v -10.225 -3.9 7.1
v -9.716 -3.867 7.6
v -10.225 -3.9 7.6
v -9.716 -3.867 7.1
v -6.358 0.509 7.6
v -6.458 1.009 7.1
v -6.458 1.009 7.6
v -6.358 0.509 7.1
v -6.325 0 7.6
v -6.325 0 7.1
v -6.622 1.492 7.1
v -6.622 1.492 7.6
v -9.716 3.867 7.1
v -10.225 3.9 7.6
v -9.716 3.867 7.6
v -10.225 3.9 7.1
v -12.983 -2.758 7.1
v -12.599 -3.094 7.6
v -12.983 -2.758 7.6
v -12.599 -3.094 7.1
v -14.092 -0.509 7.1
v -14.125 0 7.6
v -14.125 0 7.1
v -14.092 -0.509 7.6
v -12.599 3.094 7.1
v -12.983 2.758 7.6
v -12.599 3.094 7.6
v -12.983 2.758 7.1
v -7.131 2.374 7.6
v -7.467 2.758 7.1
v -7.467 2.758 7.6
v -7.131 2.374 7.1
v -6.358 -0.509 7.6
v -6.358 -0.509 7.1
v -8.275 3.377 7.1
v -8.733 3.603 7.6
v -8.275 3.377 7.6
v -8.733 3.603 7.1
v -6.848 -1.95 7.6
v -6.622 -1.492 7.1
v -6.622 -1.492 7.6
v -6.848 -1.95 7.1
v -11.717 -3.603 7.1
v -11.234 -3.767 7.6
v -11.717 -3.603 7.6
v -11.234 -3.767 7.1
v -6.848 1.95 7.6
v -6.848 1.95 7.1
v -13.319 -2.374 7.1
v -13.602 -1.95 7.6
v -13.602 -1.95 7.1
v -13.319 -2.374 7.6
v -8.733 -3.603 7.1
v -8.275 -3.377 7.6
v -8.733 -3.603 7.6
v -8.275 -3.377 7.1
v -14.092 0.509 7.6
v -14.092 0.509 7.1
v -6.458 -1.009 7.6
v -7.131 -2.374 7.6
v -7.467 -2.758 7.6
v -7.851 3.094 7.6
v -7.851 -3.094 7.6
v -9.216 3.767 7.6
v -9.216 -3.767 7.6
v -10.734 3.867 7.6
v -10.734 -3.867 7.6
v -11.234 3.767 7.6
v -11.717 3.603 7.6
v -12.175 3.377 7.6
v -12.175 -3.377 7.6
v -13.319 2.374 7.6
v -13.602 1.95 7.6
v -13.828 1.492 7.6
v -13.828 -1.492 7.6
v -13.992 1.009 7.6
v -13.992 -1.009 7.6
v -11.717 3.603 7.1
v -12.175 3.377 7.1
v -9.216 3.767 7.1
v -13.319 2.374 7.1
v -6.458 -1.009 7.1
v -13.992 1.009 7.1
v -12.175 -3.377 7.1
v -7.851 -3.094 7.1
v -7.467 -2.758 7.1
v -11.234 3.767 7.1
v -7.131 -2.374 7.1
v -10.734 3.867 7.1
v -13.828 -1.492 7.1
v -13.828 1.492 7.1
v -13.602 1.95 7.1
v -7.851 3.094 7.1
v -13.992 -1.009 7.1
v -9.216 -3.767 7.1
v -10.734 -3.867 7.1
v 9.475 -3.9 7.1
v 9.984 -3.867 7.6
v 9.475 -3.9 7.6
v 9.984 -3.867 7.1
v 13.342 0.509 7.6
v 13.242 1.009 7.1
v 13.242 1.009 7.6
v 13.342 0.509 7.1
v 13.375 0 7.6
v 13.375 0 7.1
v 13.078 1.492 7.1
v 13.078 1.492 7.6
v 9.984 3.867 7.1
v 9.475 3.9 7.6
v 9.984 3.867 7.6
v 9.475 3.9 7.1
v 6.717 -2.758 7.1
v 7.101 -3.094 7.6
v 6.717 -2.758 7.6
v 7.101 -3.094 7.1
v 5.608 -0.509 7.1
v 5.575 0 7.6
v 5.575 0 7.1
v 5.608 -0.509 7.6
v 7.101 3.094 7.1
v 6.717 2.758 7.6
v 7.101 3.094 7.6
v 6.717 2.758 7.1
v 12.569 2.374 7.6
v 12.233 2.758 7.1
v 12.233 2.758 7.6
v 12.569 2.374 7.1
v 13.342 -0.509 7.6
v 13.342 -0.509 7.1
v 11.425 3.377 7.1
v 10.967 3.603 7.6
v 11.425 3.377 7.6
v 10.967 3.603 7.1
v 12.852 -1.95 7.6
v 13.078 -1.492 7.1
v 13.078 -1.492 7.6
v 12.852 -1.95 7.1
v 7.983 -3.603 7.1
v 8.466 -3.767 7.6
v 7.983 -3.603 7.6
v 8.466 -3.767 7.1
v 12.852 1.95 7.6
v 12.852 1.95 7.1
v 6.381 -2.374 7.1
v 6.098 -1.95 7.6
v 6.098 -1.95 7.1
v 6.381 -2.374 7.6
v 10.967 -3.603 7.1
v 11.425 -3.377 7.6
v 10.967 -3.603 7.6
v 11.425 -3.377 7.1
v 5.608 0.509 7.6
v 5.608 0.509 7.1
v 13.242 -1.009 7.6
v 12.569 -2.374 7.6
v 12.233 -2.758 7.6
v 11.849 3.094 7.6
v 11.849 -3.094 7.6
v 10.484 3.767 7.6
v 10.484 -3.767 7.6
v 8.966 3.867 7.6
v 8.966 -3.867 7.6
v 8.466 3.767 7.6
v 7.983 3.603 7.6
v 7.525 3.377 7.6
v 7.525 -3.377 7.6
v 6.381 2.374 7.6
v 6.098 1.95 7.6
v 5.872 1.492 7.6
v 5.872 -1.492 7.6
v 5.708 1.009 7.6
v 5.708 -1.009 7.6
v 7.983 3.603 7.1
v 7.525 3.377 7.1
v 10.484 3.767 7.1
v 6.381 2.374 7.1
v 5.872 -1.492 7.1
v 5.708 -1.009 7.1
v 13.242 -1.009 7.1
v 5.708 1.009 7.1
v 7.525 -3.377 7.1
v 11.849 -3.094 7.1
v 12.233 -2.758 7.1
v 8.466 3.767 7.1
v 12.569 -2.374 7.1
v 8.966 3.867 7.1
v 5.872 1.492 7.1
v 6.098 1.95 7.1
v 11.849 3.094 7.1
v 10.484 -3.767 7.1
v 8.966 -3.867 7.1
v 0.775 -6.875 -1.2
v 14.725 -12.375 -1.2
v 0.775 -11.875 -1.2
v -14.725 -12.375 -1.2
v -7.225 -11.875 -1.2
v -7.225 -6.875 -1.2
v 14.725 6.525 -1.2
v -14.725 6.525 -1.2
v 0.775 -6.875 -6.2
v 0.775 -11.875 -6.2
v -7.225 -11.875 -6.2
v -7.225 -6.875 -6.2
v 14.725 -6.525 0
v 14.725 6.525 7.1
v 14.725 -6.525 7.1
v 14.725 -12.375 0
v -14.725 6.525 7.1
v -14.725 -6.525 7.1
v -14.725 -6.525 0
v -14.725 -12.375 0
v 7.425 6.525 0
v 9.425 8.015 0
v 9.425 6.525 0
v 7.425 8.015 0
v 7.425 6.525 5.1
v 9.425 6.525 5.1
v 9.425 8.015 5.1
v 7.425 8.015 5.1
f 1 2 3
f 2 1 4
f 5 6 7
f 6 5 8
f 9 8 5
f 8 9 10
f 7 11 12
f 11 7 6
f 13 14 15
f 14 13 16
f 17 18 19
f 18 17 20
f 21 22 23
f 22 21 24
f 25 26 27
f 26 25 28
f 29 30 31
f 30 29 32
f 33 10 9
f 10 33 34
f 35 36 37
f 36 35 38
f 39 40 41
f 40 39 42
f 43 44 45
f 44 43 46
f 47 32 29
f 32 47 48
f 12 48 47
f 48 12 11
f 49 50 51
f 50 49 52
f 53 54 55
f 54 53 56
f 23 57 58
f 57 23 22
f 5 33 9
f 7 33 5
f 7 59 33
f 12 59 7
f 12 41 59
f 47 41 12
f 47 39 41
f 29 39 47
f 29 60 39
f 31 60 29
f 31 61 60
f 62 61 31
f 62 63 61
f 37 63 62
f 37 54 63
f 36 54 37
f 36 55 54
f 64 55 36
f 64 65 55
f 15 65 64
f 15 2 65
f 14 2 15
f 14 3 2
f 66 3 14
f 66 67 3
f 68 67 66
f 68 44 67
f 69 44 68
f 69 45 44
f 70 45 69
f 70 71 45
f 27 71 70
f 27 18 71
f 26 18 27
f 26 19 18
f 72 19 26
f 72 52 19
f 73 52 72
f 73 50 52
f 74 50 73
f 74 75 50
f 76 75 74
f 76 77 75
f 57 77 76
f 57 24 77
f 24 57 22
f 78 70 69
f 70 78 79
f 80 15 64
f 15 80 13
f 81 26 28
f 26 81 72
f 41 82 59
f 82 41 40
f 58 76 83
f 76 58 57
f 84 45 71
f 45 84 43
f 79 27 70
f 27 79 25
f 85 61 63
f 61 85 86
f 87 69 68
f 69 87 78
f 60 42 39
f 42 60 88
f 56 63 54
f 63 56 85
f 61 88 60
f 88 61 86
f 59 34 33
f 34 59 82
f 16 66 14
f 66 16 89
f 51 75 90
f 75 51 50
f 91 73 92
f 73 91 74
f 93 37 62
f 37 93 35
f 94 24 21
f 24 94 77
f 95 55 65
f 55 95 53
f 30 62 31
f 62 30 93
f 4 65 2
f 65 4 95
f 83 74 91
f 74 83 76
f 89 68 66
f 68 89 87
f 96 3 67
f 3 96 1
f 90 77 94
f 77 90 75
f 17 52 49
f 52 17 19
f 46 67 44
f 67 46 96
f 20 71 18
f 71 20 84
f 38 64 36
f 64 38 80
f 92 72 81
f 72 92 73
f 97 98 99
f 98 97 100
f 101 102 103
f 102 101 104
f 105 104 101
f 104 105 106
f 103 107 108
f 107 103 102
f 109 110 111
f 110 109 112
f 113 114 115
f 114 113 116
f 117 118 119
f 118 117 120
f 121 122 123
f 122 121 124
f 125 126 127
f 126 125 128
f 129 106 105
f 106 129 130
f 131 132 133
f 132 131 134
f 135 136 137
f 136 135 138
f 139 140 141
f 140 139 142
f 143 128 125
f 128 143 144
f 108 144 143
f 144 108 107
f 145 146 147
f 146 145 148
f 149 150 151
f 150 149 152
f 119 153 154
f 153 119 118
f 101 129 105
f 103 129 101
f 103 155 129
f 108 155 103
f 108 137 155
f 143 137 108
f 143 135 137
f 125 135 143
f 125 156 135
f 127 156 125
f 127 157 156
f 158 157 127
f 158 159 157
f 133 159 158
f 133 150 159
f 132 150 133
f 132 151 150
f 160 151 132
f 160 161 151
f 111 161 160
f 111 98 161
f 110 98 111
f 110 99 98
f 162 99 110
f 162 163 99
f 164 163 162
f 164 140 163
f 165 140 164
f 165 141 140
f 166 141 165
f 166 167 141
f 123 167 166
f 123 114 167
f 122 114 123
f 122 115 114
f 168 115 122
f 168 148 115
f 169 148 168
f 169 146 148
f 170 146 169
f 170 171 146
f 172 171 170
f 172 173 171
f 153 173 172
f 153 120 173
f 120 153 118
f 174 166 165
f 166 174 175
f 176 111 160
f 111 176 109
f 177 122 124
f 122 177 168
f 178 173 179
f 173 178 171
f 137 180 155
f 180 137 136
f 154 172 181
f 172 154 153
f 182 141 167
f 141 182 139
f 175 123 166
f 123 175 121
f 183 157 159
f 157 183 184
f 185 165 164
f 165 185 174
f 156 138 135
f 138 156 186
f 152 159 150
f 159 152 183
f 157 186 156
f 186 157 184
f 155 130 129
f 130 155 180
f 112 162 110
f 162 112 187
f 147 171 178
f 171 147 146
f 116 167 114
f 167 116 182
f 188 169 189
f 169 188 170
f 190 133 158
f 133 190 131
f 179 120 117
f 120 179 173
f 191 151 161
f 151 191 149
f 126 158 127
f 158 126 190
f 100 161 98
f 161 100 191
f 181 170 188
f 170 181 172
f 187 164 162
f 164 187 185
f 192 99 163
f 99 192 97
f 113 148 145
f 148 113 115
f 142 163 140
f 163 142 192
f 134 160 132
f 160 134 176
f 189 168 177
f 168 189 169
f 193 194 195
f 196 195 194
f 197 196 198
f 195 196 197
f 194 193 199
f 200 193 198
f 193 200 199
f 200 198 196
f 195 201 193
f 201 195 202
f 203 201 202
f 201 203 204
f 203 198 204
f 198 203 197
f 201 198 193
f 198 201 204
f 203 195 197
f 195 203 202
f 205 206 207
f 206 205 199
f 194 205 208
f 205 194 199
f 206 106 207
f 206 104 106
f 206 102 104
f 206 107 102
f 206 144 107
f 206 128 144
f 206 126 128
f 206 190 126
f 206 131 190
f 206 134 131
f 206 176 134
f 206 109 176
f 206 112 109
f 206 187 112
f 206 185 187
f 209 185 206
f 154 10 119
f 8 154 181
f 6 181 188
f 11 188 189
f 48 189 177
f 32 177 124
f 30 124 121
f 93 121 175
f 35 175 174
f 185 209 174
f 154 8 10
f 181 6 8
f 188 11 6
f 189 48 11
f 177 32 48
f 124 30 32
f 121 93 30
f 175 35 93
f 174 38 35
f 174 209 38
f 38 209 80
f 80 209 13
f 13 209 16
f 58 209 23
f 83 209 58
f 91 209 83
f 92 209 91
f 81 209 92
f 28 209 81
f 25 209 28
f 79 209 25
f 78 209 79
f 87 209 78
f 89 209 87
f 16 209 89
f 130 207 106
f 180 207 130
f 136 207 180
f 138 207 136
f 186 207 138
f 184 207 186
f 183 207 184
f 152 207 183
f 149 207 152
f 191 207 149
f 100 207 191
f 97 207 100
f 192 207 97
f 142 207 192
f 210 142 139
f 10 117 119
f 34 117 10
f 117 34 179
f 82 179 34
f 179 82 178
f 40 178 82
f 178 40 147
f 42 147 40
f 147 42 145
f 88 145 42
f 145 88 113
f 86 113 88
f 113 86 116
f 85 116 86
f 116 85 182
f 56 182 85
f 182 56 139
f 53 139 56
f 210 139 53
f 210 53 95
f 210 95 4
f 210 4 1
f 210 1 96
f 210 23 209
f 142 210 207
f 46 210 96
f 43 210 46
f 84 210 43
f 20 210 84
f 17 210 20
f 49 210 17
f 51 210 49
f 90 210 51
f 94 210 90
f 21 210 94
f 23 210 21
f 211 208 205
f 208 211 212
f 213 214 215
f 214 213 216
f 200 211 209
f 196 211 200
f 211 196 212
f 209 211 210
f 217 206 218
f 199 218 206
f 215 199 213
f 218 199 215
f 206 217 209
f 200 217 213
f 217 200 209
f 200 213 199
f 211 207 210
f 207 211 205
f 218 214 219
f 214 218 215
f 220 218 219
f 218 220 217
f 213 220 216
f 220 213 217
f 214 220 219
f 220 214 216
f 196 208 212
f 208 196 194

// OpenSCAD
// Sharp GP2Y0D413K0F Distance Sensor Model
// Units: mm
// Origin: center of body, mounting face (PWB / connector side) toward -Z

// ===== Dimensions from datasheet =====
// Front view (looking at lens face)
body_width  = 29.45;   // horizontal width
body_height = 13.5;    // vertical height (bottom view shows 13.5)

// Side view
lens_case_height = 13.05;  // height of the main lens case block
total_height     = 18.9;   // overall height including PWB tab
lens_case_depth  = 7.1;    // depth of the lens case (Z direction from PWB)
pwb_thickness    = 1.2;    // PWB thickness
pwb_extra_depth  = 3.3;    // reference depth of connector protrusion area
top_notch_width  = 2;      // small notch on top
top_notch_offset = 6.3;    // from right edge

// Lens positions (from left edge in front view)
lens_left_x   = 4.5;
lens_right_x  = 4.5 + 19.7;  // 24.2
lens_diameter = 7.2;         // approximate lens diameter (from 8.4/7.2 dims)
lens_radius   = lens_diameter / 2;

// Connector (bottom view: 7.5 from left to connector start area, connector width ~4.15+? )
connector_offset_from_left = 7.5;  // to start of connector housing
connector_width  = 8;              // approx 3-pin connector width
connector_depth  = 6;              // Y depth of connector
connector_height = 5;              // Z height of connector below PWB

// PWB extends full width, sits at -Z side
// Lens case sits on +Z side of PWB

// Coordinate mapping:
//   Body center at origin (X,Y centered on lens case front face)
//   -Z is mounting side (PWB + connector)
//   +Z is lens face
//   X: width (29.45)
//   Y: height (13.05 for lens case)

// ===== Colors =====
case_color      = [0.15, 0.15, 0.15];
lens_color      = [0.05, 0.05, 0.08, 0.9];
pwb_color       = [0.85, 0.75, 0.55];
connector_color = [0.95, 0.95, 0.95];
pin_color       = [0.85, 0.75, 0.35];

// ===== Main body (lens case, black ABS) =====
module lens_case() {
    color(case_color)
    translate([-body_width/2, -lens_case_height/2, 0])
        cube([body_width, lens_case_height, lens_case_depth]);
}

// ===== Top notch (small protrusion) =====
// The 2mm wide notch shown at top of side view
module top_feature() {
    color(case_color)
    translate([body_width/2 - top_notch_offset - top_notch_width/2,
               lens_case_height/2 - 0.01,
               0])
        cube([top_notch_width, 1.5, lens_case_depth - 2]);
}

// ===== Lenses =====
module lens(x_from_left) {
    // Lens x measured from left edge of body
    x = -body_width/2 + x_from_left;
    // Recessed lens well + lens
    translate([x, 0, lens_case_depth - 0.5]) {
        // Recess
        color(case_color)
            cylinder(h = 1.0, r = lens_radius + 0.3, $fn = 48);
        // Lens itself
        color(lens_color)
            translate([0, 0, 0.1])
                cylinder(h = 0.6, r = lens_radius, $fn = 48);
    }
}

// ===== PWB (Paper phenol PCB) =====
// PWB is at the bottom (mounting side), extends beyond lens case in -Y
// Total height 18.9, lens case height 13.05, so PWB tab extends 5.85 below
module pwb() {
    pwb_tab_extension = total_height - lens_case_height;  // 5.85
    color(pwb_color)
    translate([-body_width/2,
               -lens_case_height/2 - pwb_tab_extension,
               -pwb_thickness])
        cube([body_width, total_height, pwb_thickness]);
}

// ===== Connector (JCTC 12001W90-3P-HF, 3-pin) =====
module connector() {
    pwb_tab_extension = total_height - lens_case_height;
    // Connector sits on the PWB tab, on the -Z side
    // Bottom view: 7.5mm from left to start, then 4.15 to pin area, 16.3 remaining
    conn_x = -body_width/2 + connector_offset_from_left;
    conn_y = -lens_case_height/2 - pwb_tab_extension + 0.5;
    
    // Connector housing
    color(connector_color)
    translate([conn_x, conn_y, -pwb_thickness - connector_height])
        cube([connector_width, connector_depth - 1, connector_height]);
    
    // Pins visible (3 pins)
    for (i = [0:2]) {
        color(pin_color)
        translate([conn_x + 1.5 + i * 1.5,
                   conn_y + (connector_depth-1)/2,
                   -pwb_thickness - connector_height + 1])
            cube([0.6, 0.6, connector_height - 1], center = false);
    }
}

// ===== Assembly =====
module GP2Y0D413K0F() {
    lens_case();
    top_feature();
    lens(lens_left_x);   // Light emitter (LED)
    lens(lens_right_x);  // Light detector (PSD)
    pwb();
    connector();
}

GP2Y0D413K0F();
